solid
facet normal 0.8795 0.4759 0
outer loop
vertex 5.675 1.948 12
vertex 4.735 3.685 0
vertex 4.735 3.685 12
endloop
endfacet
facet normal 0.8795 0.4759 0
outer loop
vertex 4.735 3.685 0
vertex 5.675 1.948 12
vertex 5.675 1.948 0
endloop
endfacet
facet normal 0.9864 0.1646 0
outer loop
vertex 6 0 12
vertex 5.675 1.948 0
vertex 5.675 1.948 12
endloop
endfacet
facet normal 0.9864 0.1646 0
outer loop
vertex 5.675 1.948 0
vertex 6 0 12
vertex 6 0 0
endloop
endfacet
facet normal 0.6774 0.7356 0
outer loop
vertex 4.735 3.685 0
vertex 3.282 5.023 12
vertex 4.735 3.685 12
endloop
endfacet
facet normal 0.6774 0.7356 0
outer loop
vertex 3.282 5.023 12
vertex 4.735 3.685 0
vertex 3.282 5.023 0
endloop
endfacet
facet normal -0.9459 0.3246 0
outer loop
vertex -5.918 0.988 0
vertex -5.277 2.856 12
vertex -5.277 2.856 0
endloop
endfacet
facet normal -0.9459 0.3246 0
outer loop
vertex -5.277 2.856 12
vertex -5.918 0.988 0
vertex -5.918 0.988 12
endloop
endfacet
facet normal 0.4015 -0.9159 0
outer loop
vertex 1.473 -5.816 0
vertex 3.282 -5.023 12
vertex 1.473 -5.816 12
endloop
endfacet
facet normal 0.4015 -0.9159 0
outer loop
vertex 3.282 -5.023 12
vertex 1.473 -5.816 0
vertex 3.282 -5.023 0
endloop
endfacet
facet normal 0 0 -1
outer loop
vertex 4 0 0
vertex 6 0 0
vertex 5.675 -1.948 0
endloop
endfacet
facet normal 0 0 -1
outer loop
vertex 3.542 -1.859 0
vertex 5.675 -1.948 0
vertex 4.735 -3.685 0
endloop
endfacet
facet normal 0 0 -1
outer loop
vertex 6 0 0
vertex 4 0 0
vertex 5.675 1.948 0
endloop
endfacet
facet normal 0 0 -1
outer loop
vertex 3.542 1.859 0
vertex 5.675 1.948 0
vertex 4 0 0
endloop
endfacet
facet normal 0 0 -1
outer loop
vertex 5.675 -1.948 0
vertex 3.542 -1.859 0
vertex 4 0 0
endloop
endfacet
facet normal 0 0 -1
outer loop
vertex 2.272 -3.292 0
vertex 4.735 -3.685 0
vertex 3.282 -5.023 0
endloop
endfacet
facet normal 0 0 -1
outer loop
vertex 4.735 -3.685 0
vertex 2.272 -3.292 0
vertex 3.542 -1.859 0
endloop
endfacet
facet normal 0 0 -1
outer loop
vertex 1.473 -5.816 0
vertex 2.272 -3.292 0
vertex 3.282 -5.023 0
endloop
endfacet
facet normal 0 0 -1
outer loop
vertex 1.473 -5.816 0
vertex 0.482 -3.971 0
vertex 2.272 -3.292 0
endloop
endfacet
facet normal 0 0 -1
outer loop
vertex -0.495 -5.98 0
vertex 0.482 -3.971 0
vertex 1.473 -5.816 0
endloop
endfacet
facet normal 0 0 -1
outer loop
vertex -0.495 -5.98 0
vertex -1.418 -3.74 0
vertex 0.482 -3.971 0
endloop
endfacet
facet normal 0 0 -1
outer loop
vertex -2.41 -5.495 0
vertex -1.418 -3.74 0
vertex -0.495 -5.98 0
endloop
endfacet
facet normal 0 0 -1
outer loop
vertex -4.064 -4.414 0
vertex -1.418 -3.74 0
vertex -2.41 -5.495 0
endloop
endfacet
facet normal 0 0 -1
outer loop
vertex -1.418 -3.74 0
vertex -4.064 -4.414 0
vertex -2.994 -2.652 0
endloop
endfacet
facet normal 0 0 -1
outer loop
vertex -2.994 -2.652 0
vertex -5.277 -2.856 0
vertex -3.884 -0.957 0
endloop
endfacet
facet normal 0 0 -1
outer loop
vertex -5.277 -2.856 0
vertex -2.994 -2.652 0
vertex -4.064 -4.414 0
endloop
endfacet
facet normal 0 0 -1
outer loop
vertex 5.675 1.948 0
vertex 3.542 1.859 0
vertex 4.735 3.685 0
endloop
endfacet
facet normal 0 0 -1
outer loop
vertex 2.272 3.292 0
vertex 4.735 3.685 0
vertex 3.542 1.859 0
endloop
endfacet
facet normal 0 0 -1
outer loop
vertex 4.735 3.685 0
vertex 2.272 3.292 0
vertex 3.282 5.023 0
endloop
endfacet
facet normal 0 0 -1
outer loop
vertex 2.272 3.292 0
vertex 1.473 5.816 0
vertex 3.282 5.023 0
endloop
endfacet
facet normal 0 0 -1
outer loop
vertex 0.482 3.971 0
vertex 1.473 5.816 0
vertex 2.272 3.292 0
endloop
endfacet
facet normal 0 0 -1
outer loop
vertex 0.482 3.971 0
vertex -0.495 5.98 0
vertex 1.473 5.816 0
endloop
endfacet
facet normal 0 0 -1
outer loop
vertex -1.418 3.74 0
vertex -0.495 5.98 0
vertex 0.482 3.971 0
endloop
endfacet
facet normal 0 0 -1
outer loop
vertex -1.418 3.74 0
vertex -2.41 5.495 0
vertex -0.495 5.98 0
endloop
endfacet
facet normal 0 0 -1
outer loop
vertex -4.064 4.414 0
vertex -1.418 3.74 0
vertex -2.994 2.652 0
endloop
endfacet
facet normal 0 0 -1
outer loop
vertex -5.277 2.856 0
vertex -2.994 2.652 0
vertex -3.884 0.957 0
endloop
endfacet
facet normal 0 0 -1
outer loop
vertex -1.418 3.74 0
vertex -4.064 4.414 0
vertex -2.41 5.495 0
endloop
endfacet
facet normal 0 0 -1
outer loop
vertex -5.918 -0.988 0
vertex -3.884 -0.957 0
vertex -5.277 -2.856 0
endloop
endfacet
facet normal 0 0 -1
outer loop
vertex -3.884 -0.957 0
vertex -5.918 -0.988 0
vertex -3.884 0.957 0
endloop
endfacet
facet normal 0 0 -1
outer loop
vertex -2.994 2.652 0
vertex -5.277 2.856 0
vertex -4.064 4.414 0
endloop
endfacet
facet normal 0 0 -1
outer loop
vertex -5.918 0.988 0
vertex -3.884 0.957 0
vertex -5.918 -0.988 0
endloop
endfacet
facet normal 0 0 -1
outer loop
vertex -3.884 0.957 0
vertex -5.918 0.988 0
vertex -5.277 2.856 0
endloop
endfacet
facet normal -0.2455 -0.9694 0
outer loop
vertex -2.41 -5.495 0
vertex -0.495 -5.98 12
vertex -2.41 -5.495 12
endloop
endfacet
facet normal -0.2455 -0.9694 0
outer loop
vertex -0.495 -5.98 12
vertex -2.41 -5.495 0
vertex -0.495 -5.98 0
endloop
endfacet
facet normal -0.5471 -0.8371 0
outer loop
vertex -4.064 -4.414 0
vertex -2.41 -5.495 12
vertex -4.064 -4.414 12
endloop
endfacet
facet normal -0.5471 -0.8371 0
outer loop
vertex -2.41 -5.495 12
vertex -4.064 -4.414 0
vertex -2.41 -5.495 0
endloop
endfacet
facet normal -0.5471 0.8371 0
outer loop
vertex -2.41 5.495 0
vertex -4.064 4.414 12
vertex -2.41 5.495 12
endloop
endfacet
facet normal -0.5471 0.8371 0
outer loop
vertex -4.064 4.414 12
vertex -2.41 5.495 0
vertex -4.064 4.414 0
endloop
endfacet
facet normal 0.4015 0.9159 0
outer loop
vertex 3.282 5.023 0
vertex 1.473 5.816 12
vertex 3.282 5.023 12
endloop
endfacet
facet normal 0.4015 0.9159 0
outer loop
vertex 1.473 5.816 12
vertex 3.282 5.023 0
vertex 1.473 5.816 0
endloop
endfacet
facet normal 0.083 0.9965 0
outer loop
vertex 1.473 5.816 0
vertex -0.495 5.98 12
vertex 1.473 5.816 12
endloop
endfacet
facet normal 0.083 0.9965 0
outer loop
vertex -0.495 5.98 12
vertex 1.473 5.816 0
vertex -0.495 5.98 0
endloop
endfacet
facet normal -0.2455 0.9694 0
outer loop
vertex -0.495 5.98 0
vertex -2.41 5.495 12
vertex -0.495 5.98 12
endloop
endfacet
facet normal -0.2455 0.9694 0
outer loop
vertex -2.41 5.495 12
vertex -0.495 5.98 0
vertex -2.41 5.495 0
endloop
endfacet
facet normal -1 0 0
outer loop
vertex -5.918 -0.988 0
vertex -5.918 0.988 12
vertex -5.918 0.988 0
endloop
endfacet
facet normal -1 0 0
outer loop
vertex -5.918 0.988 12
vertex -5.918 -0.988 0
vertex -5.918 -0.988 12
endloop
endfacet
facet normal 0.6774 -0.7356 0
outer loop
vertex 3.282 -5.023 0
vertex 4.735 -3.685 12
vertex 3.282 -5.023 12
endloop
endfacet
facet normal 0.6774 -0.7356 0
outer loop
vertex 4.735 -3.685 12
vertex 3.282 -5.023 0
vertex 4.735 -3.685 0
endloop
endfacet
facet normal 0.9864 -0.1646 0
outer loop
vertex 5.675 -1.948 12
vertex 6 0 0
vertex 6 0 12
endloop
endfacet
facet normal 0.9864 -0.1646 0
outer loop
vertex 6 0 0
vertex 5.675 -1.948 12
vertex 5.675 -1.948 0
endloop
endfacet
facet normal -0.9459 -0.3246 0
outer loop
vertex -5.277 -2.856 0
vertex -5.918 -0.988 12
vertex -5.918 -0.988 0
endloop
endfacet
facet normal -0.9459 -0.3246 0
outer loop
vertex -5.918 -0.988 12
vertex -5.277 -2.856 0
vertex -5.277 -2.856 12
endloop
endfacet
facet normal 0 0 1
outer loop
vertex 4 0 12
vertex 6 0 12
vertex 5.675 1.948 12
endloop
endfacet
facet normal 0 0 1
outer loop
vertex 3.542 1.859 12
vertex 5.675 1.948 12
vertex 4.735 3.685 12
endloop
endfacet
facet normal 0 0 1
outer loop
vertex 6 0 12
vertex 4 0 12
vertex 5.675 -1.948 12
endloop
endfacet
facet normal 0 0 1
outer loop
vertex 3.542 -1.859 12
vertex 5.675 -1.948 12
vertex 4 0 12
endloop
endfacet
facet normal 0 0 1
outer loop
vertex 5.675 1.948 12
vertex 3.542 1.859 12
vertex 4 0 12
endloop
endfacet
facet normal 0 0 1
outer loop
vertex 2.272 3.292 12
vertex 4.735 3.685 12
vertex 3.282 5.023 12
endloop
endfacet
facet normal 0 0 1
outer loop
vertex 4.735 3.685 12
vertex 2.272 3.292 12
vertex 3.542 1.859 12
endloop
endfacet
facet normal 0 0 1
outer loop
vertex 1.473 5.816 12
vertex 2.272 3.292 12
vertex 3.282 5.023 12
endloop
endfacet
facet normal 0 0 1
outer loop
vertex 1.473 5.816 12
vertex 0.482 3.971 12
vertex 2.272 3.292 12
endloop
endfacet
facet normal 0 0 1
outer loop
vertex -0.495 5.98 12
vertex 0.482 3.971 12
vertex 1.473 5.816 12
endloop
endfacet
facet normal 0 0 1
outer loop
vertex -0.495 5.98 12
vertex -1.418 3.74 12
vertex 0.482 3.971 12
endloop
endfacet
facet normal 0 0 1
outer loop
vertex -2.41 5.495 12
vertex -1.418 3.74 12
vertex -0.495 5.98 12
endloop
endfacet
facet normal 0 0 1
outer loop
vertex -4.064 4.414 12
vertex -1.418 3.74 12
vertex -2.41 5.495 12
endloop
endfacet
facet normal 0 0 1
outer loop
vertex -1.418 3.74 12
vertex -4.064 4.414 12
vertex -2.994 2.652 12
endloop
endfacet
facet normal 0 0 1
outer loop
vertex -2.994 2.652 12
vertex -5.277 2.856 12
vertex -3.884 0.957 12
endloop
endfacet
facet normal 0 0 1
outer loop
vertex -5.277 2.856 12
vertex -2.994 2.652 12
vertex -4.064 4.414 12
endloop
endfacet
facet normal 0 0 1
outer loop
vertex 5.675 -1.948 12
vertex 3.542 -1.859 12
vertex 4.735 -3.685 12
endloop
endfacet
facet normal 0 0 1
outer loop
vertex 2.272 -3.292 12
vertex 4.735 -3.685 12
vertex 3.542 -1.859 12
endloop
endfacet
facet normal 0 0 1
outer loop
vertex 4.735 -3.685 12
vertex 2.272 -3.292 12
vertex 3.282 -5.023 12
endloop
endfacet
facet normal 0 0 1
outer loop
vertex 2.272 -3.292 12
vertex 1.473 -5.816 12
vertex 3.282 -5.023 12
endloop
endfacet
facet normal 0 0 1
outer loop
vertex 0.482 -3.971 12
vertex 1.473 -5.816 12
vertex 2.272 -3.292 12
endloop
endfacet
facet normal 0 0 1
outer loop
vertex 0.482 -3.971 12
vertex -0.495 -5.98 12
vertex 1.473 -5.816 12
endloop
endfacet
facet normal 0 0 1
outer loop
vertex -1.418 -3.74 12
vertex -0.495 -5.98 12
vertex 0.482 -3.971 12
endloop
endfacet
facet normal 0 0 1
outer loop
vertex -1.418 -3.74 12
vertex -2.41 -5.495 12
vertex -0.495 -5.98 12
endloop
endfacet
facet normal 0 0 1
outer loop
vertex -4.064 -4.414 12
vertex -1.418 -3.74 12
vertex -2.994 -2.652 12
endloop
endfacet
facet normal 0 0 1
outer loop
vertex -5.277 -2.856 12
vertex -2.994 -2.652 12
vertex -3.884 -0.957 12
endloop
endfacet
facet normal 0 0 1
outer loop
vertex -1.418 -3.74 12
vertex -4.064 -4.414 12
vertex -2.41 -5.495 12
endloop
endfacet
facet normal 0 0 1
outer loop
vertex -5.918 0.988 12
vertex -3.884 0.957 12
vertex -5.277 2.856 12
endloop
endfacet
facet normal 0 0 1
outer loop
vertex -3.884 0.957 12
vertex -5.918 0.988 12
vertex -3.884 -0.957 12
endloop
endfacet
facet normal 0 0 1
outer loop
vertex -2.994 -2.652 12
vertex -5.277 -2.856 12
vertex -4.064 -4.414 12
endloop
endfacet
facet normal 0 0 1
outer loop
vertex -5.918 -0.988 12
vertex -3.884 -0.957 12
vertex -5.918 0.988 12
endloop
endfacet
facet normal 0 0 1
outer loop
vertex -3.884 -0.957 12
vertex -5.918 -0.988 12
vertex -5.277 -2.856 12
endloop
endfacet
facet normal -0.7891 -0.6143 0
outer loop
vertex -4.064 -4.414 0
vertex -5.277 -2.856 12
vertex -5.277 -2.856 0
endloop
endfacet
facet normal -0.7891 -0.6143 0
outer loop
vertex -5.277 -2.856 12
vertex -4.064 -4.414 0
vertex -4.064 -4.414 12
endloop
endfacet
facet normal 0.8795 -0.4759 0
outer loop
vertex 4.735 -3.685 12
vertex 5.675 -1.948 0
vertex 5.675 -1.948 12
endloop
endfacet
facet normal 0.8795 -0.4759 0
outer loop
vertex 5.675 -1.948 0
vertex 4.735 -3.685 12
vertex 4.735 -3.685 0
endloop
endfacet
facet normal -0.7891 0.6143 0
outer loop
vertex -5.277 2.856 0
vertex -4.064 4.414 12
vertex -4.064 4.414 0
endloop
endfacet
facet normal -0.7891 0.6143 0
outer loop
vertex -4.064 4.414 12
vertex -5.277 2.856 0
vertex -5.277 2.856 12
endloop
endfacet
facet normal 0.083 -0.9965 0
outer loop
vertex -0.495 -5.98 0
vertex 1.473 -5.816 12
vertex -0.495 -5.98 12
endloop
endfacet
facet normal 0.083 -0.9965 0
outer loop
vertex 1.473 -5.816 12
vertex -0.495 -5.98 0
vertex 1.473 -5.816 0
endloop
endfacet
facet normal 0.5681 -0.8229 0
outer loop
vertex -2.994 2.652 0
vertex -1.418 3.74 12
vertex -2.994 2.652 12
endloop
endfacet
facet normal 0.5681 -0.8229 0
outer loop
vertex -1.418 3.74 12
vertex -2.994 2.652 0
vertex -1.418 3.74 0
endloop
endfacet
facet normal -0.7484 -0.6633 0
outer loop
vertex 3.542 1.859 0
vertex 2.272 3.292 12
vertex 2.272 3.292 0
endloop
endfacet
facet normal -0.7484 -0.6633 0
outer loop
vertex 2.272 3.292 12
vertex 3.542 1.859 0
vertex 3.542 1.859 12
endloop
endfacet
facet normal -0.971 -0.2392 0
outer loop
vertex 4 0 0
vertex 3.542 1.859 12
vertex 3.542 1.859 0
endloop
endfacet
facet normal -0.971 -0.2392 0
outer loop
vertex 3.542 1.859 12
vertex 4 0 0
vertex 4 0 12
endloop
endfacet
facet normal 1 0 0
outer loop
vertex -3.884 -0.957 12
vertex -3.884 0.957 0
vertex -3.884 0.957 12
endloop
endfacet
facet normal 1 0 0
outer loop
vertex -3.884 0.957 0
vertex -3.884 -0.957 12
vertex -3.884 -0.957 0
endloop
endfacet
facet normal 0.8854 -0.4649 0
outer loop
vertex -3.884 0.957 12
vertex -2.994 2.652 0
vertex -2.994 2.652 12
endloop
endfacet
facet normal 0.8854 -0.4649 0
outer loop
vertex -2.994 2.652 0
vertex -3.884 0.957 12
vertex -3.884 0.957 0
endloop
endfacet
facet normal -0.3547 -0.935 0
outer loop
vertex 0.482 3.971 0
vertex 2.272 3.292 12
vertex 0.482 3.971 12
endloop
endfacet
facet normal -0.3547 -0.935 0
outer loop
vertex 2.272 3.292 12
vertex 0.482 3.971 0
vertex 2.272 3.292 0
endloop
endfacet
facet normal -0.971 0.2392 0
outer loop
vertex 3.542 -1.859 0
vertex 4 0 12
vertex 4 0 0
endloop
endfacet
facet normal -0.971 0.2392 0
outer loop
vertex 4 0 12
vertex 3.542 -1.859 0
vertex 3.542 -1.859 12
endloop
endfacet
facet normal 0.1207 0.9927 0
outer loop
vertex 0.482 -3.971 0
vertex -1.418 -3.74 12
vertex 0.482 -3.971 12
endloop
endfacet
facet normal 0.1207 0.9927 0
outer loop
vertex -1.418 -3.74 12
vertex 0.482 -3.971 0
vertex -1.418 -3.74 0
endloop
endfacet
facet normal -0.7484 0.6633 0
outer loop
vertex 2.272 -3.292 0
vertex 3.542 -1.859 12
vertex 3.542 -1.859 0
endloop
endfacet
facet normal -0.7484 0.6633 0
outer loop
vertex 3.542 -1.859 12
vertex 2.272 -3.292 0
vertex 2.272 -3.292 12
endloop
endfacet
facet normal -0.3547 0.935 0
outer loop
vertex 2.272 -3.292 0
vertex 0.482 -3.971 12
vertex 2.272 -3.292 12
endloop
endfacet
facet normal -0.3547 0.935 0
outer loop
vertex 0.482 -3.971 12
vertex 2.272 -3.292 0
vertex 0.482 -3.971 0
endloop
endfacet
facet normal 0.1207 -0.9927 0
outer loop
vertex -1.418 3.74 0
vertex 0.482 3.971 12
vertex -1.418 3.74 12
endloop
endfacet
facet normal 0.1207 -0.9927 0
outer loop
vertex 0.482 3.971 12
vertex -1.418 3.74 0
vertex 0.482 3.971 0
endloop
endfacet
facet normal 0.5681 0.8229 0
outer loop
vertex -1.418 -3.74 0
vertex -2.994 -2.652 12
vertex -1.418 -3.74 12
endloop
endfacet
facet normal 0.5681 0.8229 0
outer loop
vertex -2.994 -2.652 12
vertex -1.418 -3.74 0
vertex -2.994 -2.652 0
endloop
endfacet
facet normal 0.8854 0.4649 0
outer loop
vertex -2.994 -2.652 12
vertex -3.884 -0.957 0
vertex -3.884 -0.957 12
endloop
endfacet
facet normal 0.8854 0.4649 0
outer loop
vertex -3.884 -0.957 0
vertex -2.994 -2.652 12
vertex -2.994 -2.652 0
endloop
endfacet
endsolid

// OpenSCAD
difference() {
	cylinder(h = 12, r = 6);
	cylinder(h = 12, r = 4);
}
